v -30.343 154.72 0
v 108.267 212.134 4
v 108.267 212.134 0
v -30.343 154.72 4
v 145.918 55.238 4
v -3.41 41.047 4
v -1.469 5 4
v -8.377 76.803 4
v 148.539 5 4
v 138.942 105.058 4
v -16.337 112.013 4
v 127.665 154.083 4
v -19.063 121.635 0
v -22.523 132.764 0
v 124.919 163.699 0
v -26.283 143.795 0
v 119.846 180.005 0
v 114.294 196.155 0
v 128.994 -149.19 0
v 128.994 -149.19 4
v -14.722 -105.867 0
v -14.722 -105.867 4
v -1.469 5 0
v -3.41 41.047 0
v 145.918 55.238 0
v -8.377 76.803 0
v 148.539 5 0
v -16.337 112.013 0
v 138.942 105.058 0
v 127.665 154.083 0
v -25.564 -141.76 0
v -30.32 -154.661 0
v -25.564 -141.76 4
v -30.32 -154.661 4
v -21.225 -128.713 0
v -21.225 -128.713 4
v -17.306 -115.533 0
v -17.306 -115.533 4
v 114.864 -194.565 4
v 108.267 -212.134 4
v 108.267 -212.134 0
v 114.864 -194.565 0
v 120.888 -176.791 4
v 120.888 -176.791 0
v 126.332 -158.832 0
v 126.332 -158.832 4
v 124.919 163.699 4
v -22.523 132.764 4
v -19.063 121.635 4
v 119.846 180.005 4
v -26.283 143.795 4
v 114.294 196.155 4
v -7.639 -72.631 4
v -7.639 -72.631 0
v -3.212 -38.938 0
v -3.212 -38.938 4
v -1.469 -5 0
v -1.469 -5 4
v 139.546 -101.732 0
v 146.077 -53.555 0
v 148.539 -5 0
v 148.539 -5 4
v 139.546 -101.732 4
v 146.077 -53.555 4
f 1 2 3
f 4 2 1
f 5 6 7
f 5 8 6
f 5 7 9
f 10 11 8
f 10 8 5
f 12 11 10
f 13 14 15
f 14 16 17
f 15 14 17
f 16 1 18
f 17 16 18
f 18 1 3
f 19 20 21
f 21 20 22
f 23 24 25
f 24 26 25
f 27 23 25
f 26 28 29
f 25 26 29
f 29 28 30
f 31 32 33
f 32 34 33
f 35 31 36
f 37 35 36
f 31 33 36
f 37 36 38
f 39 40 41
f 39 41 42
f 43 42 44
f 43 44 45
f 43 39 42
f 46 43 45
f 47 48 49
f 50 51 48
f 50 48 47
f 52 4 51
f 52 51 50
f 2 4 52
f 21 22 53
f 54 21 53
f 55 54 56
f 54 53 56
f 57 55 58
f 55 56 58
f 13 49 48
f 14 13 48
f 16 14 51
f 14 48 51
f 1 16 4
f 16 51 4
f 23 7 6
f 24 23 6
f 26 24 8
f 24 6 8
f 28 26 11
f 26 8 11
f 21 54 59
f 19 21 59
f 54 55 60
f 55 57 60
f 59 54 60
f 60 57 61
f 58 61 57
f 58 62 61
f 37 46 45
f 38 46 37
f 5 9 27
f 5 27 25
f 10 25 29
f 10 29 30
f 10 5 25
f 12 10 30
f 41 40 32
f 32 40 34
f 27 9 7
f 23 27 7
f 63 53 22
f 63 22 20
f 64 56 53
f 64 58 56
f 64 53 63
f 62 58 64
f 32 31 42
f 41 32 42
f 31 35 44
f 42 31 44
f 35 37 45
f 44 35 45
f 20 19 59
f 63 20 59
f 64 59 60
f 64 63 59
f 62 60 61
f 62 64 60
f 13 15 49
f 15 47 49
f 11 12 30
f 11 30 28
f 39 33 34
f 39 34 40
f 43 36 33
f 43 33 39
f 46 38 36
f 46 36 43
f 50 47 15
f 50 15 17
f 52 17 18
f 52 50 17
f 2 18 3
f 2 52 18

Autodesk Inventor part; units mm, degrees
ref_plane "YZ Plane" through (0, 0, 0) normal (1, 0, 0) x (0, 1, 0)
ref_plane "XZ Plane" through (0, 0, 0) normal (0, 1, 0) x (-1, 0, 0)
ref_plane "Work Plane1" through (0, 0, 4) normal (0, 0, 1) x (1, 0, 0)
sketch "Sketch1" plane through (0, 0, 4) normal (0, 0, 1) x (1, 0, 0)
  arc A0 (-35.3271, -161.3048) -> (-35.3271, 161.3048) centre (-430, 0) ccw construction
  spline S0 degree 3 poles (-35.3271, 161.3048) (-34.9883, 161.4436) (-34.6494, 161.5824) (-33.9718, 161.86) (-33.633, 161.9988) (-33.2941, 162.1376) knots -0.219692 -0.219692 -0.219692 -0.219692 -0.109846 -0.109846 0 0 0 0 construction
  arc A1 (-33.2941, -162.1376) -> (-33.2941, 162.1376) centre (-430, 0) ccw construction
  spline S1 degree 3 poles (-33.2941, -162.1376) (-33.633, -161.9988) (-33.9718, -161.86) (-34.6494, -161.5824) (-34.9883, -161.4436) (-35.3271, -161.3048) knots -0.219692 -0.219692 -0.219692 -0.219692 -0.109846 -0.109846 0 0 0 0 construction
  line L0 (248.7389, -270.3189) -> (244.912, -279.5577) construction
  line L1 (244.912, -279.5577) -> (-33.5817, -164.2018) construction
  line L2 (-33.5817, -164.2018) -> (-29.7549, -154.963) construction
  line L3 (-29.7549, -154.963) -> (248.7389, -270.3189) construction
  line L4 (275.5471, -193.3679) -> (272.661, -202.9423) construction
  line L5 (272.661, -202.9423) -> (-15.9505, -115.9414) construction
  line L6 (-15.9505, -115.9414) -> (-13.0643, -106.3669) construction
  line L7 (-13.0643, -106.3669) -> (275.5471, -193.3679) construction
  line L8 (300, 5) -> (300, -5) construction
  line L9 (300, -5) -> (-1.4394, -5) construction
  line L10 (-1.4394, -5) -> (-1.4394, 5) construction
  line L11 (-1.4394, 5) -> (300, 5) construction
  line L12 (270.5022, 206.2306) -> (273.3065, 196.6319) construction
  line L13 (273.3065, 196.6319) -> (-16.0379, 112.1006) construction
  line L14 (-16.0379, 112.1006) -> (-18.8422, 121.6993) construction
  line L15 (-18.8422, 121.6993) -> (270.5022, 206.2306) construction
  line L16 (244.5337, 279.401) -> (248.3605, 270.1622) construction
  line L17 (248.3605, 270.1622) -> (-30.1332, 154.8063) construction
  line L18 (-30.1332, 154.8063) -> (-33.9601, 164.0451) construction
  line L19 (-33.9601, 164.0451) -> (244.5337, 279.401) construction
  arc A2 (-30.32, -154.6611) -> (-30.3426, 154.7196) centre (-430, 0) ccw
  arc A3 (108.2672, -212.1337) -> (108.2672, 212.1337) centre (-430, 0) ccw
  line L20 (108.2672, -212.1337) -> (-30.32, -154.6611)
  line L21 (128.9943, -149.19) -> (-14.7215, -105.8674)
  line L22 (148.5389, -5) -> (-1.4686, -5)
  line L23 (148.5389, 5) -> (-1.4686, 5)
  line L24 (127.6654, 154.0832) -> (-16.3369, 112.0132)
  line L25 (124.9189, 163.6988) -> (-19.0631, 121.6348)
  line L26 (108.2672, 212.1337) -> (-30.3426, 154.7196)
  line L27 (126.3315, -158.8318) -> (-17.306, -115.5328)
  point P0 (0, 0)
  dimension "d0" = 150
extrude "Extrusion1" add sketch "Sketch1" against normal blind 4 contours A2 L27 A3 L20 | A2 L22 A3 L21 | A2 L24 A3 L23 | A2 L26 A3 L25
properties part number "externalSupportRear3" material "Wood (Cherry)"
